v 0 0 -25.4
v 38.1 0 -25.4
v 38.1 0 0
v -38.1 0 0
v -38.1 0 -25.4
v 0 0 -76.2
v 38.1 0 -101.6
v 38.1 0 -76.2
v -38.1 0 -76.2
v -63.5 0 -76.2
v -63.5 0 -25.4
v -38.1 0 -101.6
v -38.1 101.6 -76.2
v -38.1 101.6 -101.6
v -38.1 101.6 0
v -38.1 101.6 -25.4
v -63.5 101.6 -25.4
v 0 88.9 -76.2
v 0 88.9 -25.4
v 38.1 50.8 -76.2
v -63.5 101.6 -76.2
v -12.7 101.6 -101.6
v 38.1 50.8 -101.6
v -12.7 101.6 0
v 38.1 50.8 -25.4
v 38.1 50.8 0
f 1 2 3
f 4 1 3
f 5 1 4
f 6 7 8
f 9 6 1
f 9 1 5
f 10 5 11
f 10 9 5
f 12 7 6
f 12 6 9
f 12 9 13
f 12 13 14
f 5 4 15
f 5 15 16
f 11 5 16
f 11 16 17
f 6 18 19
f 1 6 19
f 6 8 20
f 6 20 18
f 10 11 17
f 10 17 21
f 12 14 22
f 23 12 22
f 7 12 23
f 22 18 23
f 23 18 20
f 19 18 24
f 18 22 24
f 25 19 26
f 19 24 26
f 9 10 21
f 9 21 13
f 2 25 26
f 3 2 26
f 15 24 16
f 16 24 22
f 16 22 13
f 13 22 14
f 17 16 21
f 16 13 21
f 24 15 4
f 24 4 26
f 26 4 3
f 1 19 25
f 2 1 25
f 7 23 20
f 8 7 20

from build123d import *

# Parameters (mm, degrees)
BOSS_EXTRUDE1_DEPTH = 101.6
CUT_EXTRUDE2_DEPTH  = 102.6


with BuildPart() as part:
    # Sketch1 → Boss-Extrude1 (new body)
    with BuildSketch(Plane(origin=(0, 0, 0), x_dir=(1, 0, 0), z_dir=(0, 1, 0))):
        Polygon((0, 0), (-38.1, 0), (-38.1, 25.4), (-63.5, 25.4), (-63.5, 76.2), (-38.1, 76.2), (-38.1, 101.6), (38.1, 101.6), (38.1, 76.2), (0, 76.2), (0, 25.4), (38.1, 25.4), (38.1, 0), align=None)
    extrude(amount=BOSS_EXTRUDE1_DEPTH)

    # Sketch2 → Cut-Extrude2 (cut, through all)
    with BuildSketch(Plane.XY):
        Polygon((-12.7, 101.6), (38.1, 50.8), (38.1, 101.6), align=None)
    extrude(amount=-CUT_EXTRUDE2_DEPTH, mode=Mode.SUBTRACT)


solid = part.part
